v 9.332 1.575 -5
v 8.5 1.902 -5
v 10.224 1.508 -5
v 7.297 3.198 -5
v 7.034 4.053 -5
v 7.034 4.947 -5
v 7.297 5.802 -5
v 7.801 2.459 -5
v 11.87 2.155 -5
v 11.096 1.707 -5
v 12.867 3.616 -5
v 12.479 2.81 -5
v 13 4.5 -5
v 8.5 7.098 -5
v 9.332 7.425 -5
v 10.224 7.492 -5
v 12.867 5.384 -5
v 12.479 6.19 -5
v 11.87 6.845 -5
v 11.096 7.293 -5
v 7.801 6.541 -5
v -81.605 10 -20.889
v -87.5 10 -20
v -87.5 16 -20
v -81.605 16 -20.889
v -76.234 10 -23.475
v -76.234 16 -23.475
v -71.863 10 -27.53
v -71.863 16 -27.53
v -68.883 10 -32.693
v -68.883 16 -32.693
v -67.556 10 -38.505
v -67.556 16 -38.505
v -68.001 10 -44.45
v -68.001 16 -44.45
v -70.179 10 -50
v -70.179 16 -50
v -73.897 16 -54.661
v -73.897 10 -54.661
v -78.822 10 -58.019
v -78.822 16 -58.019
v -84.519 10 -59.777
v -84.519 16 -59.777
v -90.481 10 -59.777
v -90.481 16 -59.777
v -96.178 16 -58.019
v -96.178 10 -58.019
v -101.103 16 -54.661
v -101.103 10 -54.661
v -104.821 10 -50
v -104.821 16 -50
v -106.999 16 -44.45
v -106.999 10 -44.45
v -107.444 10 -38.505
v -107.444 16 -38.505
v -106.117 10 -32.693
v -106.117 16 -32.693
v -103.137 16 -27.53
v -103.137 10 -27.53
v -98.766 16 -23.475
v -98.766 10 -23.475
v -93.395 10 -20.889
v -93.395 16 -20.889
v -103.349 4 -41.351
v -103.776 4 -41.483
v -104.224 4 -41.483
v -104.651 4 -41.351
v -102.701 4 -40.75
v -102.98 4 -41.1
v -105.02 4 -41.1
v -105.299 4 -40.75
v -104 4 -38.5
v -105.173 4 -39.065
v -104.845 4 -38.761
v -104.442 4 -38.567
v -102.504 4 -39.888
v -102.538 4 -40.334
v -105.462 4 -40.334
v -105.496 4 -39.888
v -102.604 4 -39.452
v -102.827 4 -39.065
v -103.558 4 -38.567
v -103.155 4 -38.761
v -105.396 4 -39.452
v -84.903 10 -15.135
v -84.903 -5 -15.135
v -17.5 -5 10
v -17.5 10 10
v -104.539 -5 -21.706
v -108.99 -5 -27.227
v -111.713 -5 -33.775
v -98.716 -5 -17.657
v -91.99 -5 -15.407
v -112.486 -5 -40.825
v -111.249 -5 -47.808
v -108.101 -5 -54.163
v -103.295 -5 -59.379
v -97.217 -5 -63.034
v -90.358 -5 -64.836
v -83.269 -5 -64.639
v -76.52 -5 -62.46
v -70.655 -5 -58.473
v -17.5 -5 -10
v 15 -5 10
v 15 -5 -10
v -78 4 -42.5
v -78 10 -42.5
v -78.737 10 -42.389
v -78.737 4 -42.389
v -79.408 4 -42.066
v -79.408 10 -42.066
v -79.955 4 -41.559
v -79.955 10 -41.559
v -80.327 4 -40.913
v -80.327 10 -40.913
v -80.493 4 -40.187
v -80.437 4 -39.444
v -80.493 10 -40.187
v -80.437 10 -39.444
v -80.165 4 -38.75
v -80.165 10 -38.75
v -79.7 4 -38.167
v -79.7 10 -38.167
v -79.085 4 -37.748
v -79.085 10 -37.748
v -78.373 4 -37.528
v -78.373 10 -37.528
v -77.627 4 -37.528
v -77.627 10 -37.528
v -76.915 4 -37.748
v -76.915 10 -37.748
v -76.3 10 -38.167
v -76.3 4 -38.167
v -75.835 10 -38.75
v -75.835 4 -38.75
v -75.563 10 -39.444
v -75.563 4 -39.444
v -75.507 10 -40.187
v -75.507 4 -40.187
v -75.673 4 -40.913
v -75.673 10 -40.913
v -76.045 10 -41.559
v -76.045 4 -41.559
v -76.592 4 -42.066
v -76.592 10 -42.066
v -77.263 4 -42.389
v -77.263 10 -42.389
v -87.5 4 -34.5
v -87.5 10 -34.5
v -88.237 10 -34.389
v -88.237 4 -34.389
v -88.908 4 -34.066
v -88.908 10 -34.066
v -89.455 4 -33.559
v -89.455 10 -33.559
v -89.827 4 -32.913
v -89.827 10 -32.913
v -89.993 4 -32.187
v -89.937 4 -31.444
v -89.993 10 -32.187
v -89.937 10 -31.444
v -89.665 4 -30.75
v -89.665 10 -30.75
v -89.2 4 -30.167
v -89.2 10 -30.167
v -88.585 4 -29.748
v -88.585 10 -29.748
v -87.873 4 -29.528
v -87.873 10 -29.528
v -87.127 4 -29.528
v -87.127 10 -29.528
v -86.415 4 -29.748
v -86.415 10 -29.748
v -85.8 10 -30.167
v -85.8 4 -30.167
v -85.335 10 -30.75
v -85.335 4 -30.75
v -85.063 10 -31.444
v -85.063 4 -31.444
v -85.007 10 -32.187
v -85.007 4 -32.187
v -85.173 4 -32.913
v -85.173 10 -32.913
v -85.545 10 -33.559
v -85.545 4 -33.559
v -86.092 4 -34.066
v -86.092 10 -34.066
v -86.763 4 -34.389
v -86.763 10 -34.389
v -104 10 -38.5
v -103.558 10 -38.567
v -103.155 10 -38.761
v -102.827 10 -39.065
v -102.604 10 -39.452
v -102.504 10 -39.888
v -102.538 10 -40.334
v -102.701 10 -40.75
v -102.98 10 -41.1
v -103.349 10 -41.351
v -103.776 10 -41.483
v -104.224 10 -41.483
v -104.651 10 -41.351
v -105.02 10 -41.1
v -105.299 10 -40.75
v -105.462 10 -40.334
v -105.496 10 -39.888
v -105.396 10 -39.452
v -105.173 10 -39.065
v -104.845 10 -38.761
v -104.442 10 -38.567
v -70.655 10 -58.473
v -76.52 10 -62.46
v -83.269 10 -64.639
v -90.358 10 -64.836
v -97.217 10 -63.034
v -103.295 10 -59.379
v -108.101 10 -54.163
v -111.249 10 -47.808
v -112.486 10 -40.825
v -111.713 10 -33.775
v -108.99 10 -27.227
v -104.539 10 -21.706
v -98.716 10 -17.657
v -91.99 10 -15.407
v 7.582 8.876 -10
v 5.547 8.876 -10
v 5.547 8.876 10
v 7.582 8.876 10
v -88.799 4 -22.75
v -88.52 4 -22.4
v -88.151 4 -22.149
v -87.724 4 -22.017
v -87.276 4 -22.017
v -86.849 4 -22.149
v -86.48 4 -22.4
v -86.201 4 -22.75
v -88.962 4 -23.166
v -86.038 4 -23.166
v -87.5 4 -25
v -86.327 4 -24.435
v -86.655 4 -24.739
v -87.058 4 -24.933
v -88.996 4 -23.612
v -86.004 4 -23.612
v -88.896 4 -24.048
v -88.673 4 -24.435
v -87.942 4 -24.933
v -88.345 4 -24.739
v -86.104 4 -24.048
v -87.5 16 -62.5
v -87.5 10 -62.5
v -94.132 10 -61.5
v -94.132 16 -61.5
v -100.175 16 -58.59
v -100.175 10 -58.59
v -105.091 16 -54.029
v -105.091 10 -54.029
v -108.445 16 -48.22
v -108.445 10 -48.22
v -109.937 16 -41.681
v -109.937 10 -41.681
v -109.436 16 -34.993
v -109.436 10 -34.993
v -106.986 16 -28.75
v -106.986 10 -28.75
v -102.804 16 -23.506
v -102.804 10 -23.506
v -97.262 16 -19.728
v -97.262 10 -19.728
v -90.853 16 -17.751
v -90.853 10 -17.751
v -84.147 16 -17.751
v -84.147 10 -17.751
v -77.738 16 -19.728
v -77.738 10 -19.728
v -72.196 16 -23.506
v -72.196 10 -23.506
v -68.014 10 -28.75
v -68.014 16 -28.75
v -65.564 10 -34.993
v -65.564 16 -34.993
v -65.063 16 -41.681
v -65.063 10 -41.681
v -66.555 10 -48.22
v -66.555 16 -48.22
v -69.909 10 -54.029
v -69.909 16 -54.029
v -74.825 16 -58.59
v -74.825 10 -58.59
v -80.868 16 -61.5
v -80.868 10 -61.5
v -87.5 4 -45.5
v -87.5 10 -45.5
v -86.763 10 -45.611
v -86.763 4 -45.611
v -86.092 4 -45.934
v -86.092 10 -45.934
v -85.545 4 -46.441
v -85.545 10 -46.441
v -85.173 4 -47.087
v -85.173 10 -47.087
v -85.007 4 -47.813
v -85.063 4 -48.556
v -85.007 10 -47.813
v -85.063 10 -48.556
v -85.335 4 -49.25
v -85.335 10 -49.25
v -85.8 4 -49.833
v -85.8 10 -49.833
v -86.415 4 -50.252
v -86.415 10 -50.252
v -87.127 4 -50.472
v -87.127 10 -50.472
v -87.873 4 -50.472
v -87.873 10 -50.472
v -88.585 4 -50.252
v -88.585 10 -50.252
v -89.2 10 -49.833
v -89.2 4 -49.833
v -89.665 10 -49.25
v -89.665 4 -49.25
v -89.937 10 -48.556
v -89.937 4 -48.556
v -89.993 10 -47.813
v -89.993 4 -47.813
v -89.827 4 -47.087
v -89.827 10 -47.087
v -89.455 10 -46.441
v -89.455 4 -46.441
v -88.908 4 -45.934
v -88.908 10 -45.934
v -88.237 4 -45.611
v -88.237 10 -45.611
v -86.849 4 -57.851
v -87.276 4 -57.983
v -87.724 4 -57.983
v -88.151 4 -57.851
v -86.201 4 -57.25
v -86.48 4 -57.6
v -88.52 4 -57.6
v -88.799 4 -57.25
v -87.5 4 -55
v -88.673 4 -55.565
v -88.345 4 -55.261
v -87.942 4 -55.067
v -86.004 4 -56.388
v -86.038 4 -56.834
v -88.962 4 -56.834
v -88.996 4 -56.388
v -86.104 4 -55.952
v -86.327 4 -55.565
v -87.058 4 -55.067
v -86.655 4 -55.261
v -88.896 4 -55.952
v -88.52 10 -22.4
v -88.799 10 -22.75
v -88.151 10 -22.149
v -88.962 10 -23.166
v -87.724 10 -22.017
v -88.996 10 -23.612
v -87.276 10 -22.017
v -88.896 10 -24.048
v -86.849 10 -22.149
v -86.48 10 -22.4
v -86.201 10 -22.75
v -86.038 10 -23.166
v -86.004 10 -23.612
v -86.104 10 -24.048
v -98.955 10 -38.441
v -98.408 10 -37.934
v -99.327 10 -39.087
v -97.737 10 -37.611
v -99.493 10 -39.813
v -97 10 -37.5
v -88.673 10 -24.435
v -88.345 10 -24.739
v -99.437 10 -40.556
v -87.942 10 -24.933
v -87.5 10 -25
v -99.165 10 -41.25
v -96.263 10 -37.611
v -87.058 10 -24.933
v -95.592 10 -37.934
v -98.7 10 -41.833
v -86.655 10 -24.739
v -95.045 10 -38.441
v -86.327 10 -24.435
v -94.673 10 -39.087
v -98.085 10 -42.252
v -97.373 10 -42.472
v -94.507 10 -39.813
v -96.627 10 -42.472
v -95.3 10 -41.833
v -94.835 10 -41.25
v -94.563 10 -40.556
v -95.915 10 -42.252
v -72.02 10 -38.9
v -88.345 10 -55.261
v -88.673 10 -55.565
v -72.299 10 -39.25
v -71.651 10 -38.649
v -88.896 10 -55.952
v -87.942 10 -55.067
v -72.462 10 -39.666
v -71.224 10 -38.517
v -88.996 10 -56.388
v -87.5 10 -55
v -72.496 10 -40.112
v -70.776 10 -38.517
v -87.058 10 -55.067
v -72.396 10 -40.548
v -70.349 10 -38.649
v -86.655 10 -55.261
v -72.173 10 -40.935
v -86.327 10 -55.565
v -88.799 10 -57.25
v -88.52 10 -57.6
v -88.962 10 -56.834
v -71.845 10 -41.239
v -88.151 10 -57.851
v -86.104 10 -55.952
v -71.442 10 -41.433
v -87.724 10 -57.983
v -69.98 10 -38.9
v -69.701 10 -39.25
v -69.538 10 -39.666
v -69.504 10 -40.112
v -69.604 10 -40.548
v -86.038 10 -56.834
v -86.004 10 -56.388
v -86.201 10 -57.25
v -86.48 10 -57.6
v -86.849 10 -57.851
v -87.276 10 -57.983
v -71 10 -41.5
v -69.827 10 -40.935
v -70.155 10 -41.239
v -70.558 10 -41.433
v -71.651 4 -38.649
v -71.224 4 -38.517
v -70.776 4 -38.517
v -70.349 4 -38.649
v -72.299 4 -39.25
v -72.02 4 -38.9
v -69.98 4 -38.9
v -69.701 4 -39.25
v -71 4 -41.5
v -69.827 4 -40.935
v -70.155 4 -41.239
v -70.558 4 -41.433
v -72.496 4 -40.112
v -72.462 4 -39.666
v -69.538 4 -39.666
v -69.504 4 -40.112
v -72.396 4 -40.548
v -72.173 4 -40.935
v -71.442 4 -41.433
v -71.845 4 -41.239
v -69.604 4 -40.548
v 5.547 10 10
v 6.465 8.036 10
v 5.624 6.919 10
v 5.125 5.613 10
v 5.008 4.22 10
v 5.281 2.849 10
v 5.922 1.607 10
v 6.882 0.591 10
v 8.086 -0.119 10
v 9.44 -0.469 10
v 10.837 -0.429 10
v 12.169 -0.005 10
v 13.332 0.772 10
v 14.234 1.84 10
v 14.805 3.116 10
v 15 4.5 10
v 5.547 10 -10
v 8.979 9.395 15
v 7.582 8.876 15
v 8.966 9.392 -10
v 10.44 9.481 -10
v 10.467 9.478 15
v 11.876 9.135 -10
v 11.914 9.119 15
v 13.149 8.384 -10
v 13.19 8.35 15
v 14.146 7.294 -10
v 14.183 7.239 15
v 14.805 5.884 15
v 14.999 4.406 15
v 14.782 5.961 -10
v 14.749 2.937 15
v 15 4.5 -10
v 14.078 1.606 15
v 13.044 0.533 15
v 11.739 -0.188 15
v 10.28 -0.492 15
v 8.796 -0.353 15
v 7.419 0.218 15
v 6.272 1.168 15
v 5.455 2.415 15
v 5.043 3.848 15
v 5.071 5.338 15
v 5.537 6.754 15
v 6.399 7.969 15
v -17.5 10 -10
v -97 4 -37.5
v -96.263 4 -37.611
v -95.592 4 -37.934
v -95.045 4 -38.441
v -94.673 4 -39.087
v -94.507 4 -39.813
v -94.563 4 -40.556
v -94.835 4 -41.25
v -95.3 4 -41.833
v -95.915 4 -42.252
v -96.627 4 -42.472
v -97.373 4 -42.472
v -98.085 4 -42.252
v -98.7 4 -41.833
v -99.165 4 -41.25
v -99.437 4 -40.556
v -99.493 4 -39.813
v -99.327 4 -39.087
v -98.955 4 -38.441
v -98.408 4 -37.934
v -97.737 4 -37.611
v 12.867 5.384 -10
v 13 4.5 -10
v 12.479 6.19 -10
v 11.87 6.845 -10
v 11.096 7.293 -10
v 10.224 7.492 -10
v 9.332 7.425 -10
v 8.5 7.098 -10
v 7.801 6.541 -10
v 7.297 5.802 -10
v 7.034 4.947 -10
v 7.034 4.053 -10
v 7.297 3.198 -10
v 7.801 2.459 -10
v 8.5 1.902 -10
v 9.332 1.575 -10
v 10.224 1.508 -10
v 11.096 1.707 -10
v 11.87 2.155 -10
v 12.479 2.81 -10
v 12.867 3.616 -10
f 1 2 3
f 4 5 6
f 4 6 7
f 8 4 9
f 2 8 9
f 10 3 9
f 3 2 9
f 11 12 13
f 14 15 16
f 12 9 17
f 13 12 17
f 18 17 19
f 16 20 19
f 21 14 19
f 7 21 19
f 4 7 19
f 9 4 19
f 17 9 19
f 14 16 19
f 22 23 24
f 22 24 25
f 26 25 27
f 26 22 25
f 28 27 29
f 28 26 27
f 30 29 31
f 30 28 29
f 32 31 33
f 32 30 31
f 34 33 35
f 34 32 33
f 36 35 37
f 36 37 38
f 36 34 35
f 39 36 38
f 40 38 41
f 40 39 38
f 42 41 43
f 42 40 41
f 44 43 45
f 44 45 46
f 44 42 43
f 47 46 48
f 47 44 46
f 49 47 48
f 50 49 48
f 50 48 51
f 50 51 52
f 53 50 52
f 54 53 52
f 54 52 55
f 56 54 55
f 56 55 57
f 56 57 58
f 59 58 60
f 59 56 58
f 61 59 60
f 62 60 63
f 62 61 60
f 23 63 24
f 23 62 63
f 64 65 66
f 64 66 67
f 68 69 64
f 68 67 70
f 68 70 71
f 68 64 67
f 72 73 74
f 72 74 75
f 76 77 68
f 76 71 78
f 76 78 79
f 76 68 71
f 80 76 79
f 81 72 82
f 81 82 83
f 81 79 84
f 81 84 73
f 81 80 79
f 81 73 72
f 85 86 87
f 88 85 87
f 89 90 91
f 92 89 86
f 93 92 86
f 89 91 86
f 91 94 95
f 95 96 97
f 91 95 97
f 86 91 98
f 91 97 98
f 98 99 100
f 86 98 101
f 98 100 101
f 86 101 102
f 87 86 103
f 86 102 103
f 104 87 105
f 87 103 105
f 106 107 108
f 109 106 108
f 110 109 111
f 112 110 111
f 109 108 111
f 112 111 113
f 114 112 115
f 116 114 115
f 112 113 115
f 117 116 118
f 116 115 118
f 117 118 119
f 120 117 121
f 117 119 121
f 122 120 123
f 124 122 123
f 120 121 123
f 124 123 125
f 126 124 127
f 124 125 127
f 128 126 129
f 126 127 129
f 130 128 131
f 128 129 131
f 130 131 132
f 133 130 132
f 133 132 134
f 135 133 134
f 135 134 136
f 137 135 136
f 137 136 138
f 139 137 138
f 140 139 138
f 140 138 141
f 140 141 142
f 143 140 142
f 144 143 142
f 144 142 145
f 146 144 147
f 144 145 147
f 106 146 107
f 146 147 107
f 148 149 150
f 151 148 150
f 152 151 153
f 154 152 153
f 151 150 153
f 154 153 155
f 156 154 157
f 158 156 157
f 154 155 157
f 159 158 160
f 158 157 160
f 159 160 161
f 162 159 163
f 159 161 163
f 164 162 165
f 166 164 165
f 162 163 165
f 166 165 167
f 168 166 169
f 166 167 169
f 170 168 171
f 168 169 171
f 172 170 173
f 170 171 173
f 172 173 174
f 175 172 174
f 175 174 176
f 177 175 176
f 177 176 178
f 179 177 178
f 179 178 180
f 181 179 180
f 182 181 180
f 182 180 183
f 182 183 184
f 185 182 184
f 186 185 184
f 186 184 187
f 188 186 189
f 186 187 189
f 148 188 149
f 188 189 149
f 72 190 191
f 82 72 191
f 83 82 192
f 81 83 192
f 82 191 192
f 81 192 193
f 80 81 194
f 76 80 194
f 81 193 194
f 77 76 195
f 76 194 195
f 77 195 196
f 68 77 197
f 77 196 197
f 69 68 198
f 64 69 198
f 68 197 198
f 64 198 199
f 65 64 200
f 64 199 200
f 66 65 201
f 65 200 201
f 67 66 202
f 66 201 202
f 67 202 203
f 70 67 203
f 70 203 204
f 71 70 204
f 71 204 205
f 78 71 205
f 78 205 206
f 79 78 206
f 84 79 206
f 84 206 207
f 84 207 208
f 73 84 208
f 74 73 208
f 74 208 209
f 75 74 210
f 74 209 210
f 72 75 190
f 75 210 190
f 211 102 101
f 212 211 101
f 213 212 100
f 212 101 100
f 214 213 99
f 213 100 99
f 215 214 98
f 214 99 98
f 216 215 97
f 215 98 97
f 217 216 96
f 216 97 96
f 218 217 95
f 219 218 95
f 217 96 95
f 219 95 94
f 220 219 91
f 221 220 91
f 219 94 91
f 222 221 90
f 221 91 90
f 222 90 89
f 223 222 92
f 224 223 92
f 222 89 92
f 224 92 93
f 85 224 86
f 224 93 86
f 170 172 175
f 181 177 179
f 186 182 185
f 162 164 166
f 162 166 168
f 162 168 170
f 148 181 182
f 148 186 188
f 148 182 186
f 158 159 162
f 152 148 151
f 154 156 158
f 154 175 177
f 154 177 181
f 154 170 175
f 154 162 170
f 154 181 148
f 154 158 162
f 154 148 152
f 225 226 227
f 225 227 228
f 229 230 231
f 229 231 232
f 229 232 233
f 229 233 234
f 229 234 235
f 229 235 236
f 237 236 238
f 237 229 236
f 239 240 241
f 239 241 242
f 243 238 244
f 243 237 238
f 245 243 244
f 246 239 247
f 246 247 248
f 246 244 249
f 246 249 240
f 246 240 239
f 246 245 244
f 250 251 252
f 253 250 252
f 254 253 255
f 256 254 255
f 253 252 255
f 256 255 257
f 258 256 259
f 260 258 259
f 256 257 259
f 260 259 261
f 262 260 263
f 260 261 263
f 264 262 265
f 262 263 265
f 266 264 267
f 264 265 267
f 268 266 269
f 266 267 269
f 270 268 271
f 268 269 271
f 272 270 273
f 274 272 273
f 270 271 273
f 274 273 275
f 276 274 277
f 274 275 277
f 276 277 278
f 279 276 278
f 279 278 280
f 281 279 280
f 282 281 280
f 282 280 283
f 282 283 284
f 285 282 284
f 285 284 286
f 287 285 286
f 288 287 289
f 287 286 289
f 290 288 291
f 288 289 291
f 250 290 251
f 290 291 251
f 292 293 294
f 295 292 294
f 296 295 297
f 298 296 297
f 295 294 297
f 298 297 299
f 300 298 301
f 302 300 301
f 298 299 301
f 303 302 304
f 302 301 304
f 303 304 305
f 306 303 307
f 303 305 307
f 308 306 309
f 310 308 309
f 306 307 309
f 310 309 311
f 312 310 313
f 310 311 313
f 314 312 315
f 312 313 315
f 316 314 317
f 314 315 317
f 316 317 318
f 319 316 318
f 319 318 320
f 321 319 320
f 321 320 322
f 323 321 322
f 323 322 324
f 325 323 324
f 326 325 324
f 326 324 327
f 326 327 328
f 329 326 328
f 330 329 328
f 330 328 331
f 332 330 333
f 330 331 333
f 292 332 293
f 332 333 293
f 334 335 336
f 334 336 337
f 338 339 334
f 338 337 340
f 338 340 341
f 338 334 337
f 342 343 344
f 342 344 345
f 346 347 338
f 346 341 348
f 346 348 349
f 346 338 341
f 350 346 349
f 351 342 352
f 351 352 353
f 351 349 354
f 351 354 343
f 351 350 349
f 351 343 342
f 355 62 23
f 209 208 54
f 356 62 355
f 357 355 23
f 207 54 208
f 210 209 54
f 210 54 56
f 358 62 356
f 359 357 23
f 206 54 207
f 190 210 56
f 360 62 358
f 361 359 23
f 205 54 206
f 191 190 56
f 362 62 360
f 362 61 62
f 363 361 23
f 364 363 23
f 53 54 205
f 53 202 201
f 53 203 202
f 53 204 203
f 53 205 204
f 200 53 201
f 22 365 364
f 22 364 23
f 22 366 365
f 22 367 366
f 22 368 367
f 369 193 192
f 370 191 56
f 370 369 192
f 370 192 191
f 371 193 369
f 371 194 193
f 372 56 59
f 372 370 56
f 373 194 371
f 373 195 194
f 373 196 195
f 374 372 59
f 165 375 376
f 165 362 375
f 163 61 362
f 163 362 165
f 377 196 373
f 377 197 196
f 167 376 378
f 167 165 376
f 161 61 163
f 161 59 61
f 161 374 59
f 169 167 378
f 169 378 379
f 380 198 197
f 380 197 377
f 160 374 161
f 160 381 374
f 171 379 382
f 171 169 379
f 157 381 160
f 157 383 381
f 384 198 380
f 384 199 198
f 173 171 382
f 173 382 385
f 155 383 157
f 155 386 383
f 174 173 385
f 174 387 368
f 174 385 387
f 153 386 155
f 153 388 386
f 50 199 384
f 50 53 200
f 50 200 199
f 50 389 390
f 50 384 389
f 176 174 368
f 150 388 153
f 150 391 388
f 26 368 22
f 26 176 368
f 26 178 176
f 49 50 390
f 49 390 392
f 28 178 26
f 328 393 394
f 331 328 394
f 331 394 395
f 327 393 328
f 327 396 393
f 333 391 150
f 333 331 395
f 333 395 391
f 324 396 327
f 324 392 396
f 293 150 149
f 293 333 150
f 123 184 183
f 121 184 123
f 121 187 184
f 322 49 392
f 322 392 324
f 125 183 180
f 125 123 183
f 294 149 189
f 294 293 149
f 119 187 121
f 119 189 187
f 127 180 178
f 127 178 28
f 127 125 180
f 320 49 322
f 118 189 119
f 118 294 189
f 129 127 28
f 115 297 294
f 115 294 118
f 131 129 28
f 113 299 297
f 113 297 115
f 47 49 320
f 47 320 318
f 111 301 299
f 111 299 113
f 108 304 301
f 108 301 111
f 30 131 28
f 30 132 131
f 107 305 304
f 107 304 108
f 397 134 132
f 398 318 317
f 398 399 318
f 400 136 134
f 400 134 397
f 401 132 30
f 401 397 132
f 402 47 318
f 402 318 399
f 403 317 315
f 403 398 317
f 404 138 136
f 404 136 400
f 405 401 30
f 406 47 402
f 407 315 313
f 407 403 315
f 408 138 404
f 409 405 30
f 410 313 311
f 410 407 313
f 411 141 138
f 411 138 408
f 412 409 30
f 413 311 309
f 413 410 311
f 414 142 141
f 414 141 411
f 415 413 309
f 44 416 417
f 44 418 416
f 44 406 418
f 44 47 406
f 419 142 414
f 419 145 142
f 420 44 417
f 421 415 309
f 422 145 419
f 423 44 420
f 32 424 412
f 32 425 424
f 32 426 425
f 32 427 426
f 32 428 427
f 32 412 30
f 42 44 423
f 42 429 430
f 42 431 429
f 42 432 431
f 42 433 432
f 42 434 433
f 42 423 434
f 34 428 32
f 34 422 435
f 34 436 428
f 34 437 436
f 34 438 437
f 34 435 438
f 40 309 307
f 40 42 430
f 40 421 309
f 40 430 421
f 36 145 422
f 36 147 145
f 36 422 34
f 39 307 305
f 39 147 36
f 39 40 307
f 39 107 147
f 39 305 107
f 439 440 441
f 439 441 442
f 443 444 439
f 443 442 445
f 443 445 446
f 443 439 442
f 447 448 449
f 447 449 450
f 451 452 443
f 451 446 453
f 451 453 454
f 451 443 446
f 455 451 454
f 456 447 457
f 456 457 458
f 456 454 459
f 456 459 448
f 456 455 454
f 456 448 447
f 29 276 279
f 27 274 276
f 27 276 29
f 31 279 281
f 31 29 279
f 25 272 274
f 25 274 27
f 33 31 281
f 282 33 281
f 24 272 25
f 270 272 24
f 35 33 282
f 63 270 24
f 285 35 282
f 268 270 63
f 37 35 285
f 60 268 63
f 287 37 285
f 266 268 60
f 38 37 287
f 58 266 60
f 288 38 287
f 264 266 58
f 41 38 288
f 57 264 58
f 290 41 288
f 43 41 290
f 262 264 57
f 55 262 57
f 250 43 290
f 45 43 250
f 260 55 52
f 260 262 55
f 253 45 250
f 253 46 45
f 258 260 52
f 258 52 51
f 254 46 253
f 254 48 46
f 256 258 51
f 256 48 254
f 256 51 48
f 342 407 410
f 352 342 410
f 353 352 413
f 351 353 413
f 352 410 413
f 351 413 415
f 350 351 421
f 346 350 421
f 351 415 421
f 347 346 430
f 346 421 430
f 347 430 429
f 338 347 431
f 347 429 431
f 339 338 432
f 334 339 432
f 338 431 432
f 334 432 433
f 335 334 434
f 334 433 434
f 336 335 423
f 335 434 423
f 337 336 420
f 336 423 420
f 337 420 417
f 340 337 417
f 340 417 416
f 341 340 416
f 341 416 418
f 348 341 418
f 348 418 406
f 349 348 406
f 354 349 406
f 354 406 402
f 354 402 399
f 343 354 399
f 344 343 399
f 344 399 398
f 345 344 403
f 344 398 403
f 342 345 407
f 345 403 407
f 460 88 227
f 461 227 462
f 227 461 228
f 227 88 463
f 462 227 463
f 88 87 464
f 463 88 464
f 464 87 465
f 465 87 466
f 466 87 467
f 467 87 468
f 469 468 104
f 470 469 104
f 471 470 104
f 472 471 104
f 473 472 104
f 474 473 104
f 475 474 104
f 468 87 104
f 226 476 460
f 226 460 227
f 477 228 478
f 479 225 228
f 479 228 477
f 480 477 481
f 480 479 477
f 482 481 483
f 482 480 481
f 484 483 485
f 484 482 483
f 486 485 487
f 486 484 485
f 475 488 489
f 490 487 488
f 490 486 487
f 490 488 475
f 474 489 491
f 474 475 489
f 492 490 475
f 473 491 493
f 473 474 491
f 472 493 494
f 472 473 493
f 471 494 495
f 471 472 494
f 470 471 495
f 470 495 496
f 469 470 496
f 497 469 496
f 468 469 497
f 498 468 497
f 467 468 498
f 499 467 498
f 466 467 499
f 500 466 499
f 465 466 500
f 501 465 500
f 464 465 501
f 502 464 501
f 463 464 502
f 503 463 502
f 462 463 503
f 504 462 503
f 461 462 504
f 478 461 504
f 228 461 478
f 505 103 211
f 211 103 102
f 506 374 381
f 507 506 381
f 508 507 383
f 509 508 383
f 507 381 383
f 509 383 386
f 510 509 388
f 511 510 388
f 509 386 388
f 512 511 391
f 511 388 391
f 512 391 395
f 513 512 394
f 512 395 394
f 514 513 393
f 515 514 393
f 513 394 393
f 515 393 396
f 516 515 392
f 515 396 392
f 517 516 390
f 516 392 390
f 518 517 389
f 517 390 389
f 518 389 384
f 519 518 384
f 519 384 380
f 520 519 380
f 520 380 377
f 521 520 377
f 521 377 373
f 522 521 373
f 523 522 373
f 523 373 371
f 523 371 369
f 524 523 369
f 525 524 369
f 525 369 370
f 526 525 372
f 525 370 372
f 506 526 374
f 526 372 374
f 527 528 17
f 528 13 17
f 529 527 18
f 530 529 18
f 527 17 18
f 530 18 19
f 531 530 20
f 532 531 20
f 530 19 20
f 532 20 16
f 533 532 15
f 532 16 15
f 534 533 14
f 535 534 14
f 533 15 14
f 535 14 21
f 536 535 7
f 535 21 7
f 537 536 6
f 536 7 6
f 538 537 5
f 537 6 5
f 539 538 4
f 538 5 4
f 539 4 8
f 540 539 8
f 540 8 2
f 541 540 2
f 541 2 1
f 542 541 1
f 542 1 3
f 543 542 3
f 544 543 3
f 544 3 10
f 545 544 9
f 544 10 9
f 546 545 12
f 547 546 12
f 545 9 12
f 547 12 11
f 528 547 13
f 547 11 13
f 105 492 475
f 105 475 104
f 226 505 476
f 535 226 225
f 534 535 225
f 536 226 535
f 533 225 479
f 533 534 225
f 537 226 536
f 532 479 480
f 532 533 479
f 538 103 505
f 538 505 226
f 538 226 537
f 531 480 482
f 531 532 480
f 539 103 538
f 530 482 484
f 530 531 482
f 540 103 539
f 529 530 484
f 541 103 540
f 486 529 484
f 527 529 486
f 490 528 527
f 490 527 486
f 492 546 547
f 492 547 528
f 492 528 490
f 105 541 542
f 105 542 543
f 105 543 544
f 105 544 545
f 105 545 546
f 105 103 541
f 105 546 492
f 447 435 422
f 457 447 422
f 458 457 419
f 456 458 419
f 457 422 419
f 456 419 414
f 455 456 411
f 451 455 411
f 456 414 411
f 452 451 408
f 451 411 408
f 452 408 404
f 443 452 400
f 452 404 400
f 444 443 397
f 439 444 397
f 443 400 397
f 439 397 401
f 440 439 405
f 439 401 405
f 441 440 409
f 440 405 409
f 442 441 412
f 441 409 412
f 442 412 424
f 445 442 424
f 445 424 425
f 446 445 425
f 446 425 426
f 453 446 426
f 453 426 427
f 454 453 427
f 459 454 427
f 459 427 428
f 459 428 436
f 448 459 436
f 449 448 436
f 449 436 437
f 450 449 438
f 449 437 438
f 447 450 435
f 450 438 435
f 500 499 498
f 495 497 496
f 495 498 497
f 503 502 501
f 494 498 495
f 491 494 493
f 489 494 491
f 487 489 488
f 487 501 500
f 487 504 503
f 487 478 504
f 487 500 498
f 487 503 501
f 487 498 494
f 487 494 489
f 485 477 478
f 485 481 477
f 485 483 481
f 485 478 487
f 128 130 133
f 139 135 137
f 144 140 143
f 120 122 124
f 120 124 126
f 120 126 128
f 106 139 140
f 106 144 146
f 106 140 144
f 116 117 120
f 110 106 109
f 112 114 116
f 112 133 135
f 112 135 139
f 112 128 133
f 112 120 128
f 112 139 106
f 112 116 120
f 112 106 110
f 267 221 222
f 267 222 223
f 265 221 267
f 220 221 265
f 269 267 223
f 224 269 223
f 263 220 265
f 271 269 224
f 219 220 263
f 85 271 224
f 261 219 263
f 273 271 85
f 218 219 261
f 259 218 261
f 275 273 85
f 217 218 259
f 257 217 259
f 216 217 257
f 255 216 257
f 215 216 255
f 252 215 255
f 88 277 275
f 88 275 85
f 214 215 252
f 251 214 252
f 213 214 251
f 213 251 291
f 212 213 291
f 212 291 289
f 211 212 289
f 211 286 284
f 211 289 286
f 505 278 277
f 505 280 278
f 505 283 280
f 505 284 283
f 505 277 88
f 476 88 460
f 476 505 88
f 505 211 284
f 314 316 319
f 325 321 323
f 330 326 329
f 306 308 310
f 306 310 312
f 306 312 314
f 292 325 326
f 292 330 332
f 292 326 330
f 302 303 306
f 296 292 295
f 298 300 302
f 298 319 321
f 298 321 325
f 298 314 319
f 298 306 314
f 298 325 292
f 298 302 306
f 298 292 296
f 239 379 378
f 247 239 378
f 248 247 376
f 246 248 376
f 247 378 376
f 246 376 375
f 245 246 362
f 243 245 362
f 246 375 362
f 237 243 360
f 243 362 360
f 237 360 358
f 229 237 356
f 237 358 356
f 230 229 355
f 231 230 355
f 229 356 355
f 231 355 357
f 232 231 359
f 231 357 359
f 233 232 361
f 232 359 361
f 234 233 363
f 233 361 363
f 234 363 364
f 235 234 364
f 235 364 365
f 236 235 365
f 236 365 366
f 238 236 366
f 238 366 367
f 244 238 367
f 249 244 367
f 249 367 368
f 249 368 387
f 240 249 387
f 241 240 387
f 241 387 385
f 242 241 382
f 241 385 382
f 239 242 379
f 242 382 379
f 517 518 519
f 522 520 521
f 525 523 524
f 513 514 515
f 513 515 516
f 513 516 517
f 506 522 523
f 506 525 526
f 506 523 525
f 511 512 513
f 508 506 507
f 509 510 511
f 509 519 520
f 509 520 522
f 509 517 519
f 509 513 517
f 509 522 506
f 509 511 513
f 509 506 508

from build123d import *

# Parameters (mm, degrees)
EXTRUDE_1_DEPTH           = 10
EXTRUDE_1_DEPTH_BACK      = 5
SKETCH_1_W                = 35
SKETCH_1_H                = 20
SKETCH_17_R               = 5
EXTRUDE_3_DEPTH           = 5
SKETCH_7_R                = 3
CUT_EXTRUDE_7_DEPTH       = 5
CUT_EXTRUDE_12_DEPTH      = 26.124689053
CUT_EXTRUDE_12_DEPTH_BACK = 26.124689053
EXTRUDE_2_DEPTH           = 15
SKETCH_19_R               = 22.5
SKETCH_19_R_2             = 20
EXTRUDE_4_DEPTH           = 6
SKETCH_20_R               = 2.5
SKETCH_20_R_2             = 1.5
CUT_EXTRUDE_16_DEPTH      = 6


with BuildPart() as part:
    # 草圖1 → 填料-伸長1 (new, two sides: drawn at the far end of the back side and taken through both)
    with BuildSketch(Plane(origin=(0, 0, 0), x_dir=(1, 0, 0), z_dir=(0, 1, 0)).offset(-EXTRUDE_1_DEPTH_BACK)):
        Rectangle(SKETCH_1_W, SKETCH_1_H)
    extrude(amount=EXTRUDE_1_DEPTH + EXTRUDE_1_DEPTH_BACK)

    # 草圖17 → 填料-伸長3 (add)
    with BuildSketch(Plane.XY.offset(10)):
        with Locations((10, 4.5)):
            Circle(SKETCH_17_R)
    extrude(amount=EXTRUDE_3_DEPTH)

    # 草圖7 → 除料-伸長7 (cut, symmetric)
    with BuildSketch(Plane.XY.offset(-10)):
        with Locations((10, 4.5)):
            Circle(SKETCH_7_R)
    extrude(amount=CUT_EXTRUDE_7_DEPTH, both=True, mode=Mode.SUBTRACT)

    # 草圖12 → 除料-伸長12 (cut, two sides: drawn at the far end of the back side and taken through both)
    with BuildSketch(Plane.XY.offset(-CUT_EXTRUDE_12_DEPTH_BACK)):
        with BuildLine():
            Line((15, 4.5), (15, -5))
            Line((15, -5), (17.54652099, -5))
            Line((17.54652099, -5), (17.54652099, 10.497831093))
            Line((17.54652099, 10.497831093), (5.54652099, 10.497831093))
            Line((5.54652099, 10.497831093), (5.54652099, 8.8762607))
            Line((5.54652099, 8.8762607), (7.581665389, 8.8762607))
            ThreePointArc((7.581665389, 8.8762607), (12.540504571, 8.806487725), (15, 4.5))
        make_face()
    extrude(amount=CUT_EXTRUDE_12_DEPTH + CUT_EXTRUDE_12_DEPTH_BACK, mode=Mode.SUBTRACT)

    # 草圖14 → 填料-伸長2 (add)
    with BuildSketch(Plane(origin=(0, -5, 0), x_dir=(1, 0, 0), z_dir=(0, 1, 0))):
        with BuildLine():
            Line((-17.5, 10), (-70.654637132, 58.47251336))
            ThreePointArc((-70.654637132, 58.47251336), (-111.24926813, 47.808473813), (-84.903421397, 15.135210044))
            Line((-84.903421397, 15.135210044), (-17.5, -10))
            Line((-17.5, -10), (-17.5, 10))
        make_face()
    extrude(amount=EXTRUDE_2_DEPTH)

    # 草圖19 → 填料-伸長4 (add)
    with BuildSketch(Plane(origin=(0, 10, 0), x_dir=(1, 0, 0), z_dir=(0, 1, 0))):
        with Locations(Location((-87.5, 40, 0), (0, 0, 90))):
            Circle(SKETCH_19_R)
        with Locations(Location((-87.5, 40, 0), (0, 0, 270))):
            Circle(SKETCH_19_R_2, mode=Mode.SUBTRACT)
    extrude(amount=EXTRUDE_4_DEPTH)

    # 草圖20 → 除料-伸長16 (cut)
    with BuildSketch(Plane(origin=(0, 10, 0), x_dir=(1, 0, 0), z_dir=(0, 1, 0))):
        with Locations(Location((-87.5, 48, 0), (0, 0, 270))):
            Circle(SKETCH_20_R)
        with Locations(Location((-87.5, 56.5, 0), (0, 0, 270))):
            Circle(SKETCH_20_R_2)
        with Locations(Location((-97, 40, 0), (0, 0, 270))):
            Circle(SKETCH_20_R)
        with Locations(Location((-104, 40, 0), (0, 0, 270))):
            Circle(SKETCH_20_R_2)
        with Locations(Location((-87.5, 32, 0), (0, 0, 90))):
            Circle(SKETCH_20_R)
        with Locations(Location((-87.5, 23.5, 0), (0, 0, 90))):
            Circle(SKETCH_20_R_2)
        with Locations(Location((-71, 40, 0), (0, 0, 90))):
            Circle(SKETCH_20_R_2)
        with Locations(Location((-78, 40, 0), (0, 0, 90))):
            Circle(SKETCH_20_R)
    extrude(amount=-CUT_EXTRUDE_16_DEPTH, mode=Mode.SUBTRACT)


solid = part.part
